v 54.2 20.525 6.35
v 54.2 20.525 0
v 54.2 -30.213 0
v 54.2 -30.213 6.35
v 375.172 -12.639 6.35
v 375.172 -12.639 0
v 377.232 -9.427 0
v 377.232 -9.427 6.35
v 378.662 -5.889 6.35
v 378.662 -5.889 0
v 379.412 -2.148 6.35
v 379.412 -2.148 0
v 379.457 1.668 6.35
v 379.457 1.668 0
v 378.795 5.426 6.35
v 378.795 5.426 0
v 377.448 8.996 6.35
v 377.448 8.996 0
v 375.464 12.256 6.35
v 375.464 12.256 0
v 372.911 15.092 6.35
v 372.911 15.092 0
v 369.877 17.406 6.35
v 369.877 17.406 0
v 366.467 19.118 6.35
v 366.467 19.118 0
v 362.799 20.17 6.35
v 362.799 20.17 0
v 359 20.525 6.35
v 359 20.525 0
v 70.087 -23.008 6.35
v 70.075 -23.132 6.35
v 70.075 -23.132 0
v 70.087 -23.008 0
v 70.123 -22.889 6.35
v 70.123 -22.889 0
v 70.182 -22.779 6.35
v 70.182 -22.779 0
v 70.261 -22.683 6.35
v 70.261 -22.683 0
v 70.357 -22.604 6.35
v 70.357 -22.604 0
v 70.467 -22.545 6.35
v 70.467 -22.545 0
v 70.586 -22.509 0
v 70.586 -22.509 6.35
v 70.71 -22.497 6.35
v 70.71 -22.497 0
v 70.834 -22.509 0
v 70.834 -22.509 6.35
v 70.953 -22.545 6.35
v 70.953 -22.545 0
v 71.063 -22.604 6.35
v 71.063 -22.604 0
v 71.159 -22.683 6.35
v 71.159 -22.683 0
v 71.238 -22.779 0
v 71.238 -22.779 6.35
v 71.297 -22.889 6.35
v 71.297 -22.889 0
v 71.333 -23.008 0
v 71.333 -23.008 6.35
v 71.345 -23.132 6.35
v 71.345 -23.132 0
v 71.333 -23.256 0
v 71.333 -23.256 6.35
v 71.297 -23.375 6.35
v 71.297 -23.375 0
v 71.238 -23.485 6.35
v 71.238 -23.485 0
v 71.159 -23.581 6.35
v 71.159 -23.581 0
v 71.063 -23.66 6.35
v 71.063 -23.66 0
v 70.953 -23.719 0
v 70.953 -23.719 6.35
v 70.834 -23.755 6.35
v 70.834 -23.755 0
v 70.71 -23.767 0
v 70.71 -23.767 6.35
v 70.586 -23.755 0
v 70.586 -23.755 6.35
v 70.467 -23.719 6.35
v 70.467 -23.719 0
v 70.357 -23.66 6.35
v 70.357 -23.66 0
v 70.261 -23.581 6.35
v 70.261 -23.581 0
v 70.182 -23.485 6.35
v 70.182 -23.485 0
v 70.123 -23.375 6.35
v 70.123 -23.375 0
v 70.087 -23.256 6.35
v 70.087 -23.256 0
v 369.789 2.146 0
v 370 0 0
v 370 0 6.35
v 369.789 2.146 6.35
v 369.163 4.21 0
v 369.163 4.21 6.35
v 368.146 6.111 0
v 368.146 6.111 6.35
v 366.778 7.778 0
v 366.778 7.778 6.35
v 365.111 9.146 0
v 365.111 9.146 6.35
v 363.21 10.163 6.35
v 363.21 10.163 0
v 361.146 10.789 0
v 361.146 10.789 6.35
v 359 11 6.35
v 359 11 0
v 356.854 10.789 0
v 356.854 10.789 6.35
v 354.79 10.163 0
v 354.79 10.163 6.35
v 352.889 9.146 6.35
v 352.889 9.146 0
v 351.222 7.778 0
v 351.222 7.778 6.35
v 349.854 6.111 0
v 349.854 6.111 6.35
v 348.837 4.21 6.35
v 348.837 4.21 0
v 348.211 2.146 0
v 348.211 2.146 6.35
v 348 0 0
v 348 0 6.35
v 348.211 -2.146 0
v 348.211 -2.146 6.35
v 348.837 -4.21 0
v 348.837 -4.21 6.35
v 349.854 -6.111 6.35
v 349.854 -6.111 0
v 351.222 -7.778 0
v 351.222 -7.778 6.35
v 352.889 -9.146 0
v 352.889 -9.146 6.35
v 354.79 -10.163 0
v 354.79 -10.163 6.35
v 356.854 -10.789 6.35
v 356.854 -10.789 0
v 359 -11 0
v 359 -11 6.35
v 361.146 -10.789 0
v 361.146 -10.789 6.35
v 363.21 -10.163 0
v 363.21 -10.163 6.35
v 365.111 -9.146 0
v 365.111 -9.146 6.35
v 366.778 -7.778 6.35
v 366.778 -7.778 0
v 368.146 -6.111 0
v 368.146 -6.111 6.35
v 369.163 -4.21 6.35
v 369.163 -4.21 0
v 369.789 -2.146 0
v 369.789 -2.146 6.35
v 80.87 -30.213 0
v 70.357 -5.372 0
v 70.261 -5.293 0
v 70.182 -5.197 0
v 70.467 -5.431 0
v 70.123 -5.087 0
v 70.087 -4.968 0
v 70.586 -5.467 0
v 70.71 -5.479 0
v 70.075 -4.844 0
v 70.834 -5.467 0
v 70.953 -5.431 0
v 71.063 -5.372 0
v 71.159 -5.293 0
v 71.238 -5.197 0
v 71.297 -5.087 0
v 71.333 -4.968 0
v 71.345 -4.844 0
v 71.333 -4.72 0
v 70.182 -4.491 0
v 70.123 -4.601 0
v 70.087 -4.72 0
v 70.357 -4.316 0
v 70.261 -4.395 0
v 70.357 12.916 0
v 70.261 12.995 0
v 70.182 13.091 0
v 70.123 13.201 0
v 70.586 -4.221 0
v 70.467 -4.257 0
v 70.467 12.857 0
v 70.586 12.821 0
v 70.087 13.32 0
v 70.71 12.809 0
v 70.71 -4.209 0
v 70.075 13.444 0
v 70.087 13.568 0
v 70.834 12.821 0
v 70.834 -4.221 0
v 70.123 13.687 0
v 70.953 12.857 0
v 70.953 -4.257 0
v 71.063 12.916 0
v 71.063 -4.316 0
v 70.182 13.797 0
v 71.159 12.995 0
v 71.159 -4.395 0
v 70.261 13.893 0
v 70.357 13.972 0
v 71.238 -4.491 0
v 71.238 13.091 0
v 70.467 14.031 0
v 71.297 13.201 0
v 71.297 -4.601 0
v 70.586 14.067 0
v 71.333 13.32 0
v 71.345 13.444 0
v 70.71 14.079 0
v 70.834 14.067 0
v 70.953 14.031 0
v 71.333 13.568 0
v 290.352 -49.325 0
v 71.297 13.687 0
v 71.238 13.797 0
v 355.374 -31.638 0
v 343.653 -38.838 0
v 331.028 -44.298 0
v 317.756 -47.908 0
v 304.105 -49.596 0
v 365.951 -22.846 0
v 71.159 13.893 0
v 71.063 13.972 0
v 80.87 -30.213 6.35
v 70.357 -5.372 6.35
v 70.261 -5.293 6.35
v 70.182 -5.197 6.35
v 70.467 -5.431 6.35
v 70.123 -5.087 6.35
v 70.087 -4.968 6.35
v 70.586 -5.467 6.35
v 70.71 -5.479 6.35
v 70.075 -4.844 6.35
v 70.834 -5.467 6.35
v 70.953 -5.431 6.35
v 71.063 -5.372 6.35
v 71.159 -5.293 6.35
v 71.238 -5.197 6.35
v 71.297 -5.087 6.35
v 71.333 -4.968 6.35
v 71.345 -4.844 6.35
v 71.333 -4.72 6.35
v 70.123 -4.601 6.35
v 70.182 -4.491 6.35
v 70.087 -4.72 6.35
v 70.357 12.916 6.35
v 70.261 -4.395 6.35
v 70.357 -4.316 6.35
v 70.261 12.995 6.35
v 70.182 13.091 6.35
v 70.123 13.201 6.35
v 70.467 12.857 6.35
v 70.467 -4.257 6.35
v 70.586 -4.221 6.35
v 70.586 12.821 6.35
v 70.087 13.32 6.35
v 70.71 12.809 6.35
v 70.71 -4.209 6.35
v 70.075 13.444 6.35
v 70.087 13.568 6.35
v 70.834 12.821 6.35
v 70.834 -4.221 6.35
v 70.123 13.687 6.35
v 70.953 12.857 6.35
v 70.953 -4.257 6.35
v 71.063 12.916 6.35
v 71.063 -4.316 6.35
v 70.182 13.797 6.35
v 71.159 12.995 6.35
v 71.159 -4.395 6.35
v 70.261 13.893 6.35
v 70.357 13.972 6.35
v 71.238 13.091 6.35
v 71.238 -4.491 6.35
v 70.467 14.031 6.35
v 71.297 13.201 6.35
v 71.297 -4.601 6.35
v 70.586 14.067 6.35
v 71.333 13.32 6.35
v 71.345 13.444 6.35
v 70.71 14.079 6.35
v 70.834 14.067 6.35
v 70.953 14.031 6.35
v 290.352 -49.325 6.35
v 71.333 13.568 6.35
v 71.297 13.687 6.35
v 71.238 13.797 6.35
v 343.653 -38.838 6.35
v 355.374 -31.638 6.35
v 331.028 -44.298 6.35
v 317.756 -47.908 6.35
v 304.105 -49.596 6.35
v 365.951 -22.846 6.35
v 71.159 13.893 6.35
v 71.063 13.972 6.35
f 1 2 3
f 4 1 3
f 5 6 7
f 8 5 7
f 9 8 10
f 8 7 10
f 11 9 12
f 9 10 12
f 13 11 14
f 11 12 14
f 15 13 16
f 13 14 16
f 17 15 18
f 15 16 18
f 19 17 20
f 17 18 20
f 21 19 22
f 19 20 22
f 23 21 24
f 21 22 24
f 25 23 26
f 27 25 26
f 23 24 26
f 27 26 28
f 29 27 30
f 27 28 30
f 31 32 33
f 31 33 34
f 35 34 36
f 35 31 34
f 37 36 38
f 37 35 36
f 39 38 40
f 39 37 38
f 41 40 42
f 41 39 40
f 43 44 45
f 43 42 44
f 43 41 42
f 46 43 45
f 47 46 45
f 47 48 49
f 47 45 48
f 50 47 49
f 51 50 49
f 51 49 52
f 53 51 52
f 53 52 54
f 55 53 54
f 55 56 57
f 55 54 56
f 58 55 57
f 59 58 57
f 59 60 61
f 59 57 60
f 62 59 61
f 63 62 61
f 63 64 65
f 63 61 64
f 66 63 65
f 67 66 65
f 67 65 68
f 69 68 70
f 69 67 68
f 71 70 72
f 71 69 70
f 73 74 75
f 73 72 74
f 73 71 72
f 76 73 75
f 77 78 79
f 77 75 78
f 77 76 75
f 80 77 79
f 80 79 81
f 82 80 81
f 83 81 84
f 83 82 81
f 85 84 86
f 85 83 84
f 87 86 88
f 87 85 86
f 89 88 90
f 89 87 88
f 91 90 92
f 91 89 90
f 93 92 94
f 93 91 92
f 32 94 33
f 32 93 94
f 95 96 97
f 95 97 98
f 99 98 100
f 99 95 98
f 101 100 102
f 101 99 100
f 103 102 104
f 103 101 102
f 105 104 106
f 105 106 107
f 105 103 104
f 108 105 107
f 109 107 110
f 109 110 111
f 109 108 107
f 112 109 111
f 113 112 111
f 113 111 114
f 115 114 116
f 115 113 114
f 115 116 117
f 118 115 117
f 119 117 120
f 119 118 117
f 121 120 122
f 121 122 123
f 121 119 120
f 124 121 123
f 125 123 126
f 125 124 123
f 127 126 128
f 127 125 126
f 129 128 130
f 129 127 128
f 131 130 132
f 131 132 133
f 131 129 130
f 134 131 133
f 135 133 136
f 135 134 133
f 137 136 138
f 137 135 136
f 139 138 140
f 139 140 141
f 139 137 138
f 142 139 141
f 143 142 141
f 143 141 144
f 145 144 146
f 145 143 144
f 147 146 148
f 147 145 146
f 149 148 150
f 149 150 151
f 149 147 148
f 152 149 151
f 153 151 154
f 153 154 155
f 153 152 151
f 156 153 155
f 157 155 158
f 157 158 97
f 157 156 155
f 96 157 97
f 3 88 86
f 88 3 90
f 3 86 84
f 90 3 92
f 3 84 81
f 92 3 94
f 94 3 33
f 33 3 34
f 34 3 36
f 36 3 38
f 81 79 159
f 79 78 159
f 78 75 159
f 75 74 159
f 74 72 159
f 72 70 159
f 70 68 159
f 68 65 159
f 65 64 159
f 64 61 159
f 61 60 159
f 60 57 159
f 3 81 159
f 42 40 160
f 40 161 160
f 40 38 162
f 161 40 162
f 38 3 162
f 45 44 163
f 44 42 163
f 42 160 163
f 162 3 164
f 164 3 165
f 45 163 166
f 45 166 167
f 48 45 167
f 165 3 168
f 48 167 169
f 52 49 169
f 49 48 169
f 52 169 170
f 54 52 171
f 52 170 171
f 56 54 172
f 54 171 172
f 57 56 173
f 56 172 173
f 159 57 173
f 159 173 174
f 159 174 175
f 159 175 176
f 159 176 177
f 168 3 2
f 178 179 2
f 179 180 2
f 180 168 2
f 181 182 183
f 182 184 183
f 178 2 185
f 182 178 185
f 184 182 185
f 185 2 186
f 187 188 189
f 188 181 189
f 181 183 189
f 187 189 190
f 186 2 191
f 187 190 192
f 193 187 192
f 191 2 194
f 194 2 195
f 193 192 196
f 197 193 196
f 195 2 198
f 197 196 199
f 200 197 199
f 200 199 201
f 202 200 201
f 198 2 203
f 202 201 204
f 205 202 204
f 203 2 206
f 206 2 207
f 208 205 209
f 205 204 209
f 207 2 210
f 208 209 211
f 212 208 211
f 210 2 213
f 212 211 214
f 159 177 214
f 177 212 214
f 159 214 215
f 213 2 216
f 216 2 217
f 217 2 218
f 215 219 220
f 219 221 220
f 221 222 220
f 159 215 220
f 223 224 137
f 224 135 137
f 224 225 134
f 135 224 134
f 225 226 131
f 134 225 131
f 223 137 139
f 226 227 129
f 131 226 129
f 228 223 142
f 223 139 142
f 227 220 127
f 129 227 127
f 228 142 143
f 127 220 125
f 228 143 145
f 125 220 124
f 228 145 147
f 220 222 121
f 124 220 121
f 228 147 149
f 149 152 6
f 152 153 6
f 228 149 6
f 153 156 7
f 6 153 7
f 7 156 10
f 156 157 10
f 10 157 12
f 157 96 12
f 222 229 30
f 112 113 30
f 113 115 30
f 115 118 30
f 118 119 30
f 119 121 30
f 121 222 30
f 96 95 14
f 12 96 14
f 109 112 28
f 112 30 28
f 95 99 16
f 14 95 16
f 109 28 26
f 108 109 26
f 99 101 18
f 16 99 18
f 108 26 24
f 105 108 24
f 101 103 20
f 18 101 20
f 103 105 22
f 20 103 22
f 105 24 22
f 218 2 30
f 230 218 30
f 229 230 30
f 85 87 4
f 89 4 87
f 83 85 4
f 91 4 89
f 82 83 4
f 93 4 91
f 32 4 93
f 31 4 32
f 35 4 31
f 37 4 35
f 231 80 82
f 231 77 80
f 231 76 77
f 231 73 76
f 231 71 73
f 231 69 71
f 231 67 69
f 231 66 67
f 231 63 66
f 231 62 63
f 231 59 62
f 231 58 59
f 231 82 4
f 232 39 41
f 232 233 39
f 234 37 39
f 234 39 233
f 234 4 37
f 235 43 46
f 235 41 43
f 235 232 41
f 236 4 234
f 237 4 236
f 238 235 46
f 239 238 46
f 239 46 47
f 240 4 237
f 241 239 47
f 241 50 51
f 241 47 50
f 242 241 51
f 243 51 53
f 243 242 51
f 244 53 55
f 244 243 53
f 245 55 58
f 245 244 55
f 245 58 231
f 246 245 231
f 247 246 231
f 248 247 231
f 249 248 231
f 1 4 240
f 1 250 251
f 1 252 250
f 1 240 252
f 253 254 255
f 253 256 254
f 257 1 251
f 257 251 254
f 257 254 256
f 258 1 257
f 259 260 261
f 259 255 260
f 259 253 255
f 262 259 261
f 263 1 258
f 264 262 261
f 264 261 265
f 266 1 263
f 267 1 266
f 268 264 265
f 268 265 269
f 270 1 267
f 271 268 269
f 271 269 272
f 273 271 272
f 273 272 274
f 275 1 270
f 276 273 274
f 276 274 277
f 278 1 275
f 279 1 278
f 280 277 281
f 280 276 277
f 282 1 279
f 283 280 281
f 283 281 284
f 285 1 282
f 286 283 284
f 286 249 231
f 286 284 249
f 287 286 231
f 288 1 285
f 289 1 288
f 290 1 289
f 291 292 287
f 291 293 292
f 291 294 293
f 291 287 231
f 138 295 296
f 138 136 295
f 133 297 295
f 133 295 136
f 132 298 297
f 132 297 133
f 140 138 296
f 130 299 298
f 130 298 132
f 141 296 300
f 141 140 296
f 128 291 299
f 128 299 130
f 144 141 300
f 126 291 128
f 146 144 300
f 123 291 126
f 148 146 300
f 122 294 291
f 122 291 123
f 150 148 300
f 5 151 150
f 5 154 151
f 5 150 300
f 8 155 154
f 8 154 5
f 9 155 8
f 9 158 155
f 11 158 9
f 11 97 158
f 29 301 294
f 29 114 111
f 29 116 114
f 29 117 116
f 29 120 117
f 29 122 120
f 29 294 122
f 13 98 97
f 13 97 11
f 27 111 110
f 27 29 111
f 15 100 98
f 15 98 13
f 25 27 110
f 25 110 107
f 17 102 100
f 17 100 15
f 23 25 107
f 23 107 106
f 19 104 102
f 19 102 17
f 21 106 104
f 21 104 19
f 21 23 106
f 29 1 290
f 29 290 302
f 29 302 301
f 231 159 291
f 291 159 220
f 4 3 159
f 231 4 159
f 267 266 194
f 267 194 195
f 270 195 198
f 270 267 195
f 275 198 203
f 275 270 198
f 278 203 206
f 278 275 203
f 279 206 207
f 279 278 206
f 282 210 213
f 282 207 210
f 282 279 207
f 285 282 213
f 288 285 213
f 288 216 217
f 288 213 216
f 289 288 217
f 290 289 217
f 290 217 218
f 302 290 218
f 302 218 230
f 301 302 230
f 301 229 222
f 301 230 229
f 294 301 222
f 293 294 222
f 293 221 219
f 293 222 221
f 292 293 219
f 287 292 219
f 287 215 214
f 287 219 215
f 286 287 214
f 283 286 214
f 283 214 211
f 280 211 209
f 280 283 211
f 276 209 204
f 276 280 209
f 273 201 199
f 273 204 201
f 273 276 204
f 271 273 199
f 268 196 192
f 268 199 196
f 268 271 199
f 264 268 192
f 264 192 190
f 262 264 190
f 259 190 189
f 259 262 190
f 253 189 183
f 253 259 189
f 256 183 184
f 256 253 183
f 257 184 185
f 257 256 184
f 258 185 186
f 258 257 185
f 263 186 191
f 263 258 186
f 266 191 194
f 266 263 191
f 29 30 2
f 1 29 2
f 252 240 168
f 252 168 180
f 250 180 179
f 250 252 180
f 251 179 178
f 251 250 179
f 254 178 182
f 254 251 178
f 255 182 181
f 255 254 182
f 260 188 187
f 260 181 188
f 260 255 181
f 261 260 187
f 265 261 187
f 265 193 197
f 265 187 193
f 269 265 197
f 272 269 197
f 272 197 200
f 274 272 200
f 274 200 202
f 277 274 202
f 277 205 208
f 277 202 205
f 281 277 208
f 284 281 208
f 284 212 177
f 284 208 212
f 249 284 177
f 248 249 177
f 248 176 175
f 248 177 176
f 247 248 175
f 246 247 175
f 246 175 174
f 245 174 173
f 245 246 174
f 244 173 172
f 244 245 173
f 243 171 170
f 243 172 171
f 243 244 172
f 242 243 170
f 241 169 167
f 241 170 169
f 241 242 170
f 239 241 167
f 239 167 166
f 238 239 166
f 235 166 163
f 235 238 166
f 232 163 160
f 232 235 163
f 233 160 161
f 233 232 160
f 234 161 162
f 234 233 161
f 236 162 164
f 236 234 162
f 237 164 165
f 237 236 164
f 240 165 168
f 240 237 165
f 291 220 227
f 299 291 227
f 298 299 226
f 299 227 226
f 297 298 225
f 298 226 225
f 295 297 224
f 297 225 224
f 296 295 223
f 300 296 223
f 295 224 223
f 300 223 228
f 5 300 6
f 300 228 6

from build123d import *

# Parameters (mm, degrees)
SKETCH1_R               = 11
BOSS_EXTRUDE1_DEPTH     = 6.35
CUT_EXTRUDE1_DEPTH      = 383.821165724
CUT_EXTRUDE1_DEPTH_BACK = 383.821165724
SKETCH2_R               = 0.635


with BuildPart() as part:
    # Sketch1 → Boss-Extrude1 (new body)
    with BuildSketch(Plane.XY):
        with BuildLine():
            Line((54.2, -30.213113696), (80.87, -30.213113696))
            Line((80.87, -30.213113696), (290.352370469, -49.325))
            ThreePointArc((290.352370469, -49.325), (337.438235998, -41.792944501), (375.172105998, -12.638774172))
            ThreePointArc((375.172105998, -12.638774172), (377.448393763, 8.996243247), (359, 20.525))
            Line((359, 20.525), (54.2, 20.525))
            Line((54.2, 20.525), (54.2, -30.213113696))
        make_face()
        with Locations((359, 0)):
            Circle(SKETCH1_R, mode=Mode.SUBTRACT)
    extrude(amount=BOSS_EXTRUDE1_DEPTH)

    # Sketch2 → Cut-Extrude1 (cut, two sides: drawn at the far end of the back side and taken through both)
    with BuildSketch(Plane(origin=(0, 0, 0), x_dir=(-1, 0, 0), z_dir=(0, 0, -1)).offset(-CUT_EXTRUDE1_DEPTH_BACK)):
        with Locations((-70.71, -23.132056848)):
            Circle(SKETCH2_R)
        with Locations((-70.71, -4.844056848)):
            Circle(SKETCH2_R)
        with Locations((-70.71, 13.443943152)):
            Circle(SKETCH2_R)
    extrude(amount=CUT_EXTRUDE1_DEPTH + CUT_EXTRUDE1_DEPTH_BACK, mode=Mode.SUBTRACT)


solid = part.part
